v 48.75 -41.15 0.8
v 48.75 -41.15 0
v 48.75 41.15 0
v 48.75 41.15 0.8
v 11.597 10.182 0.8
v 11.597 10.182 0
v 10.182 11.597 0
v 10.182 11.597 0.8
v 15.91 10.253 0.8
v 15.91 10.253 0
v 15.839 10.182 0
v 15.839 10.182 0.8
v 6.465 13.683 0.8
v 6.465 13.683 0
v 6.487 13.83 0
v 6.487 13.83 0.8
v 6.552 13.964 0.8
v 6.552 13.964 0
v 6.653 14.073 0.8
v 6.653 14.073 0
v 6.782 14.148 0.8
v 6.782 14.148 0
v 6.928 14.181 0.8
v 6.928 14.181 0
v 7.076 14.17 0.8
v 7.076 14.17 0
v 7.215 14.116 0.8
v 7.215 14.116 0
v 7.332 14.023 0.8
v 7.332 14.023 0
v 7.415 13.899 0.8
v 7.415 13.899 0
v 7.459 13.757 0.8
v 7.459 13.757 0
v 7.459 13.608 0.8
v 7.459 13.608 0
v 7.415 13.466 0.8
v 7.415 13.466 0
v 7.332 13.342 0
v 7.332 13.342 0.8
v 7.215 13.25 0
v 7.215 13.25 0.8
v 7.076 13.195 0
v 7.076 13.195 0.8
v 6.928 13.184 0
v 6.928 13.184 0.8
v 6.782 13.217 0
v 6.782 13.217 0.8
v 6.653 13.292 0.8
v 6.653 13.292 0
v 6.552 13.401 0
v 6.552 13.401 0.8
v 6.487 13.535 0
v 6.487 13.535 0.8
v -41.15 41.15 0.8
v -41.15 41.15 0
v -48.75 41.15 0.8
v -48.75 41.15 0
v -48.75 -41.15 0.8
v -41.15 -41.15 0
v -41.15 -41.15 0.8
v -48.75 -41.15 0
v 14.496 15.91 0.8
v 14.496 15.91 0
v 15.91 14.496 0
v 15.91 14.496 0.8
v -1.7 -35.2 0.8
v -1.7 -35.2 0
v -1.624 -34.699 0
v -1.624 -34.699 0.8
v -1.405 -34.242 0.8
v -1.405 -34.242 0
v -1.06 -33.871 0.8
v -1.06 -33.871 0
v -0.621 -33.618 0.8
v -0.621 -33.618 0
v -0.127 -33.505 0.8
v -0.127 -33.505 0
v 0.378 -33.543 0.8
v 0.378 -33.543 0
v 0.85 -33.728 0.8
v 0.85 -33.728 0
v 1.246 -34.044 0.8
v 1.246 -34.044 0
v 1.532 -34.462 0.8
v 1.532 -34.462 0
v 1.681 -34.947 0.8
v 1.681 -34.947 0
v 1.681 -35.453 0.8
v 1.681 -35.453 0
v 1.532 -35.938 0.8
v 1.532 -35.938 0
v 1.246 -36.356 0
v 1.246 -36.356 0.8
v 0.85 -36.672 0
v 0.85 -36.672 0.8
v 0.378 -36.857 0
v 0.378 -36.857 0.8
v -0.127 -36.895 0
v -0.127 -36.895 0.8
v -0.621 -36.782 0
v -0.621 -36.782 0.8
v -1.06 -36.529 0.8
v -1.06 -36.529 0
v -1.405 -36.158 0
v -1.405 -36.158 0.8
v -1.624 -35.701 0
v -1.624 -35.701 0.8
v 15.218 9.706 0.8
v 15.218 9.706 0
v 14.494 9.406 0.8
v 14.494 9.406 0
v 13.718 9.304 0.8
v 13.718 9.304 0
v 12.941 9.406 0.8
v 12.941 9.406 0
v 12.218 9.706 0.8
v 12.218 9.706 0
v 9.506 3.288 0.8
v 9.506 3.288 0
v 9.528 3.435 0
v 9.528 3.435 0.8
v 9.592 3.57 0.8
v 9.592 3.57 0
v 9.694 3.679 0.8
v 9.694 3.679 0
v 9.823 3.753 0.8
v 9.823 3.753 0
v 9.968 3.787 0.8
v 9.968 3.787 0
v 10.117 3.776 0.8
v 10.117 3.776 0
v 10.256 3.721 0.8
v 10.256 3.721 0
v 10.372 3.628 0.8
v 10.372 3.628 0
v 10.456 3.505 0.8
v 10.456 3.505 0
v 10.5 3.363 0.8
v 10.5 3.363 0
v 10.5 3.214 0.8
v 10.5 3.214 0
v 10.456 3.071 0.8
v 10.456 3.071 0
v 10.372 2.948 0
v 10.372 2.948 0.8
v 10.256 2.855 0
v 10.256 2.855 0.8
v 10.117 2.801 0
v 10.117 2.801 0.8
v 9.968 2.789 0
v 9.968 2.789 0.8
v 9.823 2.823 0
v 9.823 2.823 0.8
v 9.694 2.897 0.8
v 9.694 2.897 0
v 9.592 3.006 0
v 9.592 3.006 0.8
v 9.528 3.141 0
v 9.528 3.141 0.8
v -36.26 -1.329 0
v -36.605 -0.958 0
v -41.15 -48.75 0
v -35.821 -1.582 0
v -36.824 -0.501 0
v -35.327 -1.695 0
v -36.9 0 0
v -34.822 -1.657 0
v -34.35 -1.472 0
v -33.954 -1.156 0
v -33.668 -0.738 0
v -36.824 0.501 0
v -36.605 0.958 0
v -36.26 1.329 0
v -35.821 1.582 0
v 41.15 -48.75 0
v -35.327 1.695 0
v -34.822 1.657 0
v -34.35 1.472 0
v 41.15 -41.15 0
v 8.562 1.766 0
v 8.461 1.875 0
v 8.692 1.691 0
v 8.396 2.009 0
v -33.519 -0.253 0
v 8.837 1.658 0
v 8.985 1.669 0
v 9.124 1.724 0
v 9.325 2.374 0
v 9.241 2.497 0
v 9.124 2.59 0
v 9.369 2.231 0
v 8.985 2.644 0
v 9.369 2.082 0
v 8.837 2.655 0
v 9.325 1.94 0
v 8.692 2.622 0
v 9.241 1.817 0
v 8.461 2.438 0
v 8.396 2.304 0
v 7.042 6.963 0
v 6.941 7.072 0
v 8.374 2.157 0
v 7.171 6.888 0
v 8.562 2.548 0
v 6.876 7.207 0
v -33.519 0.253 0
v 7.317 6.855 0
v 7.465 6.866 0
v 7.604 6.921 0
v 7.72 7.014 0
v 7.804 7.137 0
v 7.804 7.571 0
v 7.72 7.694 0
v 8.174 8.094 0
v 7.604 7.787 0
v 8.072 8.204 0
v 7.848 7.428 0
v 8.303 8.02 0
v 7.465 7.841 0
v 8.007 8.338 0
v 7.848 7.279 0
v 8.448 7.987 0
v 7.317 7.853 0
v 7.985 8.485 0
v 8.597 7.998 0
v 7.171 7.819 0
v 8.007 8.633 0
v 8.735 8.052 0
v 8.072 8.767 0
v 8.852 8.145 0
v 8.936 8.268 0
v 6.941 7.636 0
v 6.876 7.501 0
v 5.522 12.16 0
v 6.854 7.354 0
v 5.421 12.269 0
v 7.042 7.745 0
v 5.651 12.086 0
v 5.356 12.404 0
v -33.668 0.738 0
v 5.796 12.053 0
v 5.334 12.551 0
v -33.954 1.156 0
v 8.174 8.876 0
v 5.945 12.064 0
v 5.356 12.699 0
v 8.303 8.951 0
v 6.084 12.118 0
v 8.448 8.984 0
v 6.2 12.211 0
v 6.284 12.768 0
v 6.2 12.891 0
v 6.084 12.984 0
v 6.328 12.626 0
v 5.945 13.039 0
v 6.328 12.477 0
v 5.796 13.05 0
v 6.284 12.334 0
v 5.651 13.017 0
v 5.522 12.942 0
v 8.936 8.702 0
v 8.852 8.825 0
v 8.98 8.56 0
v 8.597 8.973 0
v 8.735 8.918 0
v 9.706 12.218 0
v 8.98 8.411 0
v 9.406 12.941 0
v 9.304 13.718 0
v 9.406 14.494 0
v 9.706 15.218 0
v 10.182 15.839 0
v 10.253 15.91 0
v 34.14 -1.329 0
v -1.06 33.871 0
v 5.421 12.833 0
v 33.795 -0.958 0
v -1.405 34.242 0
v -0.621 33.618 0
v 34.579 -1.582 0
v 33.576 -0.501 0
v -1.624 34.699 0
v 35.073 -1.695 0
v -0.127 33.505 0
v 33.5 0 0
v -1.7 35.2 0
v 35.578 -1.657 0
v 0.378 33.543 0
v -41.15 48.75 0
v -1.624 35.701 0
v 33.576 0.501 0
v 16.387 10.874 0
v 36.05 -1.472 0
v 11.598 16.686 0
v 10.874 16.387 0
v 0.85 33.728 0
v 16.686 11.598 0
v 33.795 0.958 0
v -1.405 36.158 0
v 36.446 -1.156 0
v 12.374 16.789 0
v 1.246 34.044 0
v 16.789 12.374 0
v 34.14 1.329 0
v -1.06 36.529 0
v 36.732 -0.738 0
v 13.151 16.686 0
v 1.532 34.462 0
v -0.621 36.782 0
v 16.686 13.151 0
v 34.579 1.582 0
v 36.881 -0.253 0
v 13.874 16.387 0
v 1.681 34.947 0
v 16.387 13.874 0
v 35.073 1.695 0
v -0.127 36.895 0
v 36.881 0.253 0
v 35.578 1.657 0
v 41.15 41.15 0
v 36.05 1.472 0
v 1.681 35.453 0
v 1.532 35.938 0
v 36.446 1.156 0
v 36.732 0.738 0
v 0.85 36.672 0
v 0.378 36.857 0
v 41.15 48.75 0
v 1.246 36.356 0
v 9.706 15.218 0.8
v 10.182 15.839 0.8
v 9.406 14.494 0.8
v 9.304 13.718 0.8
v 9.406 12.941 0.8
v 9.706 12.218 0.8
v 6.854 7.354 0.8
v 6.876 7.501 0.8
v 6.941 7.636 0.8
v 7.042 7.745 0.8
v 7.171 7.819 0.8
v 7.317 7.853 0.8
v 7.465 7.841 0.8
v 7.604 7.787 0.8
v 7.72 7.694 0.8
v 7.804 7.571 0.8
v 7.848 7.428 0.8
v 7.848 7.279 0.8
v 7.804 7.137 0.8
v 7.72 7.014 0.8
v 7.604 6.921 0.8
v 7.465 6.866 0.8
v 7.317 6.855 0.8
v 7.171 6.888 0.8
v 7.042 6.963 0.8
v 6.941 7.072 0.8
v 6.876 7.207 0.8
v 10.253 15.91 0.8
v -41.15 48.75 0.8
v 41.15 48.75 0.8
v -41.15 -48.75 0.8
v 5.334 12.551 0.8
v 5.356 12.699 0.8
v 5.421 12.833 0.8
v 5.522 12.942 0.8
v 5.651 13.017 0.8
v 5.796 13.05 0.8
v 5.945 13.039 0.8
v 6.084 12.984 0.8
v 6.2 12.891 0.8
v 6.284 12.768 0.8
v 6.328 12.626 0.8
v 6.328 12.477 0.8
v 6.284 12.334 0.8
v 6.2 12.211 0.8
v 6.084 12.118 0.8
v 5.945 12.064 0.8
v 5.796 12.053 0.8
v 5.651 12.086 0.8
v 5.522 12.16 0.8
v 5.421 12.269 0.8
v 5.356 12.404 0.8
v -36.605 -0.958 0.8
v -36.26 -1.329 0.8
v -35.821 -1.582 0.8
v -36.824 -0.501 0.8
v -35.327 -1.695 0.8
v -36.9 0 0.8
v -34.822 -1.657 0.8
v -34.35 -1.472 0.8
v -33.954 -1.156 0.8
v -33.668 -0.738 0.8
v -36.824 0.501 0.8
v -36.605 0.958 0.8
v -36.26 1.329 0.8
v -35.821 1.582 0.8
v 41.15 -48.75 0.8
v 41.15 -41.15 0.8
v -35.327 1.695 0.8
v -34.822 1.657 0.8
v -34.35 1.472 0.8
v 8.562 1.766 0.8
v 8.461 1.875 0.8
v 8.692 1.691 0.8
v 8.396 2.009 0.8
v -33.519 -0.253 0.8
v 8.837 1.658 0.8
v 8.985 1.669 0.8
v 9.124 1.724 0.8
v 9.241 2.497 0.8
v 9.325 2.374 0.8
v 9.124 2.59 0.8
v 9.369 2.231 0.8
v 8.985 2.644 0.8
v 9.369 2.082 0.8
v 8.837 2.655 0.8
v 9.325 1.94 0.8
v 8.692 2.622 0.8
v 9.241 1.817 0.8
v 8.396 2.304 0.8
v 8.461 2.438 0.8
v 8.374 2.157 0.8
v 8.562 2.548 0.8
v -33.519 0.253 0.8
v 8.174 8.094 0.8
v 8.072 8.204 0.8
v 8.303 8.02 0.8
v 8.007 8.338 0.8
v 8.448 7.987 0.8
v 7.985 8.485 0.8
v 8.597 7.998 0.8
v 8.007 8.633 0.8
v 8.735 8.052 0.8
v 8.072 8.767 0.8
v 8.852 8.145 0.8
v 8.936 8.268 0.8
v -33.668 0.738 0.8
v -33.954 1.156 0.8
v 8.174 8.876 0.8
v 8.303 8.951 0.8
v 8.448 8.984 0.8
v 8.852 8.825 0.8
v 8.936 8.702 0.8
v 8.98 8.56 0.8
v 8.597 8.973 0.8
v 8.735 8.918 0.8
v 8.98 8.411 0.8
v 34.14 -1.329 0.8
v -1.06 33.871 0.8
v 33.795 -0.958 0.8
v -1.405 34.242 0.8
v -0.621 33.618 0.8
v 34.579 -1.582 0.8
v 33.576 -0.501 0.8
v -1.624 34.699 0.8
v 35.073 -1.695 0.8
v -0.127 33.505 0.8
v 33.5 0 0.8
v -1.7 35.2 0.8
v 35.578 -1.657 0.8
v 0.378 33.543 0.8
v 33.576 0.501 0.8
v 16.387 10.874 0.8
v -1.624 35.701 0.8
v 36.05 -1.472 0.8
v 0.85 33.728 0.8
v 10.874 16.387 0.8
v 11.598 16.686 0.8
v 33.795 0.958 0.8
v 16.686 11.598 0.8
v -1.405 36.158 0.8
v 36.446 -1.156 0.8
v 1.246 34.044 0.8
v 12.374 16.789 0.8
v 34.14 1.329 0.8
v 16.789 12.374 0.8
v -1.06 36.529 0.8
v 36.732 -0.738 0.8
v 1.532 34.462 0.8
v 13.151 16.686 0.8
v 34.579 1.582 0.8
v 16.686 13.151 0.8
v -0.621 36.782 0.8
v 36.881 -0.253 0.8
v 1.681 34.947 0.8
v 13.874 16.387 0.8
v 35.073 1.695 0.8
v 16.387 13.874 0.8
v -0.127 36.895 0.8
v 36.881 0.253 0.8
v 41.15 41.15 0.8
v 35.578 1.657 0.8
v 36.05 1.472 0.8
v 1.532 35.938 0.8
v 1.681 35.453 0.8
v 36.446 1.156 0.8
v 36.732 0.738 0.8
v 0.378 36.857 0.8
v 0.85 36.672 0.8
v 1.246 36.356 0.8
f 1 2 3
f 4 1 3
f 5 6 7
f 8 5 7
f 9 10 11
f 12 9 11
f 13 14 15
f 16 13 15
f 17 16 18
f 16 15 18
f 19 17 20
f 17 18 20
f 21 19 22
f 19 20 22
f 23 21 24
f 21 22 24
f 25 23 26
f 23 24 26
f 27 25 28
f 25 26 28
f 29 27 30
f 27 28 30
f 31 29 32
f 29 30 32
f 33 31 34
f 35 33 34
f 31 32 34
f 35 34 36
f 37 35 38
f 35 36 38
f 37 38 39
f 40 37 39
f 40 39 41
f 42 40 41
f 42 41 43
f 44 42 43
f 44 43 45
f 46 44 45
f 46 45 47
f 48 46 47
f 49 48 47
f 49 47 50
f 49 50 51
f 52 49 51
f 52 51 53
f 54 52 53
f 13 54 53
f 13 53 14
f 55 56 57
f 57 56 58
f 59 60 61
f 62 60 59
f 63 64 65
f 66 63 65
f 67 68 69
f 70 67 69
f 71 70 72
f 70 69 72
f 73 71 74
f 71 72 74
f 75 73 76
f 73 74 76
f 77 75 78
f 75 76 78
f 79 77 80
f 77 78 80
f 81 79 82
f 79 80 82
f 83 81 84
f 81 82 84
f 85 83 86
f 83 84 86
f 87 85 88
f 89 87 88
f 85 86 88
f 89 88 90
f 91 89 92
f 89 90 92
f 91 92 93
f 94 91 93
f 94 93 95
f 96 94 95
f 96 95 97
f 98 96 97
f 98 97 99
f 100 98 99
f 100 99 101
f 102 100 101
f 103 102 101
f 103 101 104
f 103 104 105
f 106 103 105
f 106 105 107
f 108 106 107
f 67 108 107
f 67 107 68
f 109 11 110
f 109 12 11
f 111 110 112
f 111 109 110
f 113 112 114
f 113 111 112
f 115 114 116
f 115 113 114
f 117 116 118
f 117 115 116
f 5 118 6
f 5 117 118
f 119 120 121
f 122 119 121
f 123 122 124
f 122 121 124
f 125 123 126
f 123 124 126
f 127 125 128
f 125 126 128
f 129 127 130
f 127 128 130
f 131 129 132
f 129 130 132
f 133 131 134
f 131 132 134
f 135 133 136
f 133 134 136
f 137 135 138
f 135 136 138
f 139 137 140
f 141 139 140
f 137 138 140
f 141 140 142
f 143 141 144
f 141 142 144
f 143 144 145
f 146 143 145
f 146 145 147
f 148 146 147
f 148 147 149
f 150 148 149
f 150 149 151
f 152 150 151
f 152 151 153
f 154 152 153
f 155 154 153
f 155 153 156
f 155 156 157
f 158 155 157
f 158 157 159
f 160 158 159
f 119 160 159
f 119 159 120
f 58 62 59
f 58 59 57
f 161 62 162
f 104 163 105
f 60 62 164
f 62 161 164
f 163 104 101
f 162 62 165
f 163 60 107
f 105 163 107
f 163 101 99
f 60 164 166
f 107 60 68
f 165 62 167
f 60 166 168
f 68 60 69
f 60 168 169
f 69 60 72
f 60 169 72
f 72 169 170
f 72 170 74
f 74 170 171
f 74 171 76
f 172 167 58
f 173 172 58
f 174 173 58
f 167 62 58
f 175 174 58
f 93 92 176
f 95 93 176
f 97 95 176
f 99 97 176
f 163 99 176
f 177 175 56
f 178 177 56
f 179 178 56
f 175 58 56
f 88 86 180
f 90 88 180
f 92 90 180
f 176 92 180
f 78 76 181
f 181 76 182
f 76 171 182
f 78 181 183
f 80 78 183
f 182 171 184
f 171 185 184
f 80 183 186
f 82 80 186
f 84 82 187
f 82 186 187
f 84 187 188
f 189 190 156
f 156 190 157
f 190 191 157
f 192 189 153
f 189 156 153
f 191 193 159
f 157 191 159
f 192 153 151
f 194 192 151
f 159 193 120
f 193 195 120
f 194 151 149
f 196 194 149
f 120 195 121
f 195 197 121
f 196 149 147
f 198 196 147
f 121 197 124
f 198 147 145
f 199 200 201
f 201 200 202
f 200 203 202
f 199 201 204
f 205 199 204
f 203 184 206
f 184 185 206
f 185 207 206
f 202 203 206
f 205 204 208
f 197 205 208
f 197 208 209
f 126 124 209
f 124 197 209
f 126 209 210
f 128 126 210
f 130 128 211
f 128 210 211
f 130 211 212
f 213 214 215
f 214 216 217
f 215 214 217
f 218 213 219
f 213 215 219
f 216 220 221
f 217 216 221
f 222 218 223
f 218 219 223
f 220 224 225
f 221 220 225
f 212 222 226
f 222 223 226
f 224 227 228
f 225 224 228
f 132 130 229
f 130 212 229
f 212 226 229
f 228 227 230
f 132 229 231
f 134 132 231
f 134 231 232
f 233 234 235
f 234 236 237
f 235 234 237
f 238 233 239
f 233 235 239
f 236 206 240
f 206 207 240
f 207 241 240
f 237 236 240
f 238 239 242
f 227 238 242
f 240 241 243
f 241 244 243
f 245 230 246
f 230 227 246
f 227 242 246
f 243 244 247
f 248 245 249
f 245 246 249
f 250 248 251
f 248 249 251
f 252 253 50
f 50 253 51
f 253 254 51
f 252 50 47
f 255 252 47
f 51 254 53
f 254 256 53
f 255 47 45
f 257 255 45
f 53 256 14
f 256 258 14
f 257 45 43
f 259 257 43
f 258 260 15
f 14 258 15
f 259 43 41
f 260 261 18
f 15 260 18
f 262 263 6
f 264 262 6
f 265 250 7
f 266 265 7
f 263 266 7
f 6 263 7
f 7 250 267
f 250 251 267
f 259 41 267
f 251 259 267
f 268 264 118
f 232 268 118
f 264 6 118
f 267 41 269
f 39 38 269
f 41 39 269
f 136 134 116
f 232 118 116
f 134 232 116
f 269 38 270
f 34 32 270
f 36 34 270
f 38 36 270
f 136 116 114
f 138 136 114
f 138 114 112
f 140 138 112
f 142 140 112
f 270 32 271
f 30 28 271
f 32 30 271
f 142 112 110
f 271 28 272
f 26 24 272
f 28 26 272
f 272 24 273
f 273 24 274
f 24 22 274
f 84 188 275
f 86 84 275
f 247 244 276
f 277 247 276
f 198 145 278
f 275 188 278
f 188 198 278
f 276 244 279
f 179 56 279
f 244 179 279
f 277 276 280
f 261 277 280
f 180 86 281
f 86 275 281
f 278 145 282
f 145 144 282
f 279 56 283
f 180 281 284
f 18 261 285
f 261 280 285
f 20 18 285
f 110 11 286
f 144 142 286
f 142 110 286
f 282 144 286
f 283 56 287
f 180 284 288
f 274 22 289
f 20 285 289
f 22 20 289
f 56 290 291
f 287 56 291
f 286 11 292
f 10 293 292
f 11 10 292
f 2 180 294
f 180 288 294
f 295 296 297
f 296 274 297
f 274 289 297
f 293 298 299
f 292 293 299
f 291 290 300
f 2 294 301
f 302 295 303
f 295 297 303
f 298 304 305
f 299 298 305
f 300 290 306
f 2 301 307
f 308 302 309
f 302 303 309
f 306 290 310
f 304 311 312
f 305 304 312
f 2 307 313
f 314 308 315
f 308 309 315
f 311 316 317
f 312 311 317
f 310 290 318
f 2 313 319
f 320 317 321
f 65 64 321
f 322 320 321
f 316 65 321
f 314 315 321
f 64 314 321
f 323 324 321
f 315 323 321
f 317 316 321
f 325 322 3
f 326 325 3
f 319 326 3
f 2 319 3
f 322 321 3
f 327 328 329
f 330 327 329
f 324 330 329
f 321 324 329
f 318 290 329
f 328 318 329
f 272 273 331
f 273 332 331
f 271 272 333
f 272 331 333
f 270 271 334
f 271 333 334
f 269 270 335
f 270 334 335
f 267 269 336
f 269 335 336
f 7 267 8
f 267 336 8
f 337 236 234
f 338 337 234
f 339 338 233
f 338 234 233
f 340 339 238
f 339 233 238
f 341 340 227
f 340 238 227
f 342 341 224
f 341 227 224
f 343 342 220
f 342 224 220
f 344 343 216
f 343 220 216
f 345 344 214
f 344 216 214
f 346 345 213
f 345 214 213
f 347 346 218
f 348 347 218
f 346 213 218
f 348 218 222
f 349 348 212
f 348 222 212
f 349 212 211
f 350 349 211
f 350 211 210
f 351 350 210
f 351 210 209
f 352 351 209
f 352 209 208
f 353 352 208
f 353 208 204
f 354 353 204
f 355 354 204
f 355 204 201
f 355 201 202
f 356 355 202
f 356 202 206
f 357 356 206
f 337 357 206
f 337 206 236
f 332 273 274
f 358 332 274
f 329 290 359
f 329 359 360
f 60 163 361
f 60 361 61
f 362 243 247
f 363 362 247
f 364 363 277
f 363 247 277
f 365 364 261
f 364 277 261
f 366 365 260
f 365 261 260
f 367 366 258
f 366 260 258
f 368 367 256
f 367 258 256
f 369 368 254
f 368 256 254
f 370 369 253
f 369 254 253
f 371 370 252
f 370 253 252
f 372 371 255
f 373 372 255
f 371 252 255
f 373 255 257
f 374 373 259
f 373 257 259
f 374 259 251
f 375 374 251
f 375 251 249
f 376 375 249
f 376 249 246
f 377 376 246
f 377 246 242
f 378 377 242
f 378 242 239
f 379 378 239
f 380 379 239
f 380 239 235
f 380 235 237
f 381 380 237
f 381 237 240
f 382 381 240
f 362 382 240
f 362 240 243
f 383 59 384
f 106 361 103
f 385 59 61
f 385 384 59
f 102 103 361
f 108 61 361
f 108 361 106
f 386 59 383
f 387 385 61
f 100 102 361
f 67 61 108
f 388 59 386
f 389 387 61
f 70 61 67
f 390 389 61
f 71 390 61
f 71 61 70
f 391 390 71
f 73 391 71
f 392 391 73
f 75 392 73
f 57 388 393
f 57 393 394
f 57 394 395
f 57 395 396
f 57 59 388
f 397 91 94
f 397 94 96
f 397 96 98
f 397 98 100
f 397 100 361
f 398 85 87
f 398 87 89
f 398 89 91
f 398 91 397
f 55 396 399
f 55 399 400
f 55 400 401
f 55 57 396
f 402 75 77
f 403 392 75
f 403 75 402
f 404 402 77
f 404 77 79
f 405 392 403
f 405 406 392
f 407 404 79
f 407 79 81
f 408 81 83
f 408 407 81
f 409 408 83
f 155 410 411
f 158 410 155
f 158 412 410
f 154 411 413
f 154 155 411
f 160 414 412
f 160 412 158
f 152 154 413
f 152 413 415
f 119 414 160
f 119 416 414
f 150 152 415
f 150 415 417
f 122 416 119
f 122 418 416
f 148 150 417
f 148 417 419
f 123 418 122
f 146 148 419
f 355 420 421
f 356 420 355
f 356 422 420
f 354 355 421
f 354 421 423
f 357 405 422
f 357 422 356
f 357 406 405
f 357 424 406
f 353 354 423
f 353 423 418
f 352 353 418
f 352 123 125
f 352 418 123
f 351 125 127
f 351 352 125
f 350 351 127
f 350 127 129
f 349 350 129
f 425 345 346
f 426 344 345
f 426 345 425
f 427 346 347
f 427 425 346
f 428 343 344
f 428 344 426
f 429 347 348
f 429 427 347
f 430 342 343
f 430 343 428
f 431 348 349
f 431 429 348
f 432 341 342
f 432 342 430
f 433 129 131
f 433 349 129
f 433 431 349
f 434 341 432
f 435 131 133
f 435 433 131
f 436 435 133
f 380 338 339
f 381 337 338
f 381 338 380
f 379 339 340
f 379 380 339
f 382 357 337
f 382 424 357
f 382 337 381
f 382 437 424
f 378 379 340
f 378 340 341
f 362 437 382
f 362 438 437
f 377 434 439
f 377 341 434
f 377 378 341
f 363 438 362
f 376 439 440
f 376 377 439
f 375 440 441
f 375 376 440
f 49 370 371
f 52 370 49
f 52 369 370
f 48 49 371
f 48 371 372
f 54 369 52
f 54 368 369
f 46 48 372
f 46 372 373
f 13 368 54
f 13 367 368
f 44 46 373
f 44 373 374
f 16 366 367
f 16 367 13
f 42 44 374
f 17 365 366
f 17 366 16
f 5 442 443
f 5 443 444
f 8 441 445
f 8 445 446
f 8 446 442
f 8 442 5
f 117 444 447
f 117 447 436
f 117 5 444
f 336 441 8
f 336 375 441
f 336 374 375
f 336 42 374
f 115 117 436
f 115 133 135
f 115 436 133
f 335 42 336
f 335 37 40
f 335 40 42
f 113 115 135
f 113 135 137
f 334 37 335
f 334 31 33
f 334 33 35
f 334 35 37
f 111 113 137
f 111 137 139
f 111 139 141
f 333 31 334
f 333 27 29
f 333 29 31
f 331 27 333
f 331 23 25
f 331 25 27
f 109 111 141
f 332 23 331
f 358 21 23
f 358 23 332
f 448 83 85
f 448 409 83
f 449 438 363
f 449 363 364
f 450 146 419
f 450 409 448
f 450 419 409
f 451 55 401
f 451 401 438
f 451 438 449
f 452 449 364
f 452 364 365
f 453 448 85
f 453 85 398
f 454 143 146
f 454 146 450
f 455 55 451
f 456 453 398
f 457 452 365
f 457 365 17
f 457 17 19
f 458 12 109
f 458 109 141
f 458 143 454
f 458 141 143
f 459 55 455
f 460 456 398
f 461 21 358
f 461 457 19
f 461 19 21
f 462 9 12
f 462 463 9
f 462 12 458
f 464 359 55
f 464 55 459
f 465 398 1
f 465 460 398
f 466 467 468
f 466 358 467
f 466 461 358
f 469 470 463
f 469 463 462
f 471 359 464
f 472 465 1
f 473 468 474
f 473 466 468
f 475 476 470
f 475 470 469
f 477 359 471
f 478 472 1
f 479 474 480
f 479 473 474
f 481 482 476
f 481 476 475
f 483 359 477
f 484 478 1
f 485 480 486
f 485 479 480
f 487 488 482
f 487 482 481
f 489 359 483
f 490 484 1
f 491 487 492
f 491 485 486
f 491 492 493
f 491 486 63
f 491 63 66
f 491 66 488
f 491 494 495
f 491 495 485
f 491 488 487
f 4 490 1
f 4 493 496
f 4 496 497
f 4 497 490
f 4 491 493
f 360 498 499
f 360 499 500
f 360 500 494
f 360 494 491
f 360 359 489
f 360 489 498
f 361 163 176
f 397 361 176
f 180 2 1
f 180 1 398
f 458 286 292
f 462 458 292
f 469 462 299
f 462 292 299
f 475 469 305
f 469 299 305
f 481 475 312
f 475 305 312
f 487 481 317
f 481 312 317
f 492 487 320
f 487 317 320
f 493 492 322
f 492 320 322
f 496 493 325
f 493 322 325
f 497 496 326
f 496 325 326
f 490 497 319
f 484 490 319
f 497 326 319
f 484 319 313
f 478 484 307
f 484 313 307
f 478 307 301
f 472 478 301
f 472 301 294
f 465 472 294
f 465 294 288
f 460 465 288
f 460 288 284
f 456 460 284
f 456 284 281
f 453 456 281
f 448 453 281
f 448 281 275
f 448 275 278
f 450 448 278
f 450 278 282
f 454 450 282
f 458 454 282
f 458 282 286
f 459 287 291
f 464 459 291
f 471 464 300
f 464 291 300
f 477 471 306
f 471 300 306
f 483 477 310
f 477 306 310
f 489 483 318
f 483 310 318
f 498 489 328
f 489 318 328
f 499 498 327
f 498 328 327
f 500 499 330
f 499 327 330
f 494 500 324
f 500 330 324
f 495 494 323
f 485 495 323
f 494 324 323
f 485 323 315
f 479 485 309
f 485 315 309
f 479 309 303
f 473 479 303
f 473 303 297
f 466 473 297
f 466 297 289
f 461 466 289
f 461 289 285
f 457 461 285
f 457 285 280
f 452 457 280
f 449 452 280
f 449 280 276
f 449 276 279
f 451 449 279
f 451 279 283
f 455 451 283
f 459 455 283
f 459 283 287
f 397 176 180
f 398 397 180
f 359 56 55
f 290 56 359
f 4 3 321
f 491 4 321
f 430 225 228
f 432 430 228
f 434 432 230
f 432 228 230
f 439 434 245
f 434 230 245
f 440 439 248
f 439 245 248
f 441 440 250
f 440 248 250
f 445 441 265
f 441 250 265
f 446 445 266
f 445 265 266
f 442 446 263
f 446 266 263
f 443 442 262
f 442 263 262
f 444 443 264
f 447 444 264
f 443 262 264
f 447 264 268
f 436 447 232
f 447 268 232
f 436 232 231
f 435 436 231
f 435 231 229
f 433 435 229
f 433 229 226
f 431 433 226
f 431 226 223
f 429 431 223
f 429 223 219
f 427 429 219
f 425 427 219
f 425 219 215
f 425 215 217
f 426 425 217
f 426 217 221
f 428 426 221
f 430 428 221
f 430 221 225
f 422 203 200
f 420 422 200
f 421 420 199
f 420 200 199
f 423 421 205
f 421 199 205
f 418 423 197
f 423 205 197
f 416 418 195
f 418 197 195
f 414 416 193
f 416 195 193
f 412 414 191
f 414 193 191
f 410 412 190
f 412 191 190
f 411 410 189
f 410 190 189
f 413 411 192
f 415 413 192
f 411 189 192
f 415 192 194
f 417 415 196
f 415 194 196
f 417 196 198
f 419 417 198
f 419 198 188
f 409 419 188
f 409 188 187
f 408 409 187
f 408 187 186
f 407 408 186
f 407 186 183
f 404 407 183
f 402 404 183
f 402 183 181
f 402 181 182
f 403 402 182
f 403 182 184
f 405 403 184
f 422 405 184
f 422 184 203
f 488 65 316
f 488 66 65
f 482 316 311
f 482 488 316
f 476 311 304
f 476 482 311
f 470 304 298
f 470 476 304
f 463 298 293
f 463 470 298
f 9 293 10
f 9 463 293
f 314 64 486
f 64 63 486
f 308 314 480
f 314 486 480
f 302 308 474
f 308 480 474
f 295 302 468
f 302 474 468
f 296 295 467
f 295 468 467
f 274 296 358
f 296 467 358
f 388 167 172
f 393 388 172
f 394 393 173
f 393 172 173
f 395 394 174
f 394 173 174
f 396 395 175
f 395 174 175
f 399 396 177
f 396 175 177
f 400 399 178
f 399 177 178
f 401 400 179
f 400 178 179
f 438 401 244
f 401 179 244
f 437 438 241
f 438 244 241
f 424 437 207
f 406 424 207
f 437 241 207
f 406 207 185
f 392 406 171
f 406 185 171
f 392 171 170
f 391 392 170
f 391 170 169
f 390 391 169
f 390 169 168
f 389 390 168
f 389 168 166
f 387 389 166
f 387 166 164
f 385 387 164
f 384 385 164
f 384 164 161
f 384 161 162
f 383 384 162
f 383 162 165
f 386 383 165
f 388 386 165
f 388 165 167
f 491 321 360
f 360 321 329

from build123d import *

# Parameters (mm, degrees)
SKETCH1_W           = 97.5
SKETCH1_H           = 97.5
BOSS_EXTRUDE1_DEPTH = 0.8
SKETCH2_W           = 7.6
SKETCH2_H           = 7.6
CUT_EXTRUDE1_DEPTH  = 1.8
SKETCH3_R           = 1.7
CUT_EXTRUDE2_DEPTH  = 1.8
CUT_EXTRUDE3_DEPTH  = 1.8
SKETCH5_R           = 0.5
CUT_EXTRUDE4_DEPTH  = 1.8
FILLET2_R           = 3


with BuildPart() as part:
    # Sketch1 → Boss-Extrude1 (new body)
    with BuildSketch(Plane.XY):
        Rectangle(SKETCH1_W, SKETCH1_H)
    extrude(amount=BOSS_EXTRUDE1_DEPTH)

    # Sketch2 → Cut-Extrude1 (cut, through all)
    with BuildSketch(Plane(origin=(0, 0, 0), x_dir=(-1, 0, 0), z_dir=(0, 0, -1))):
        with Locations((-44.95, 44.95)):
            Rectangle(SKETCH2_W, SKETCH2_H)
        with Locations((-44.95, -44.95)):
            Rectangle(SKETCH2_W, SKETCH2_H)
        with Locations((44.95, -44.95)):
            Rectangle(SKETCH2_W, SKETCH2_H)
        with Locations((44.95, 44.95)):
            Rectangle(SKETCH2_W, SKETCH2_H)
    extrude(amount=-CUT_EXTRUDE1_DEPTH, mode=Mode.SUBTRACT)

    # Sketch3 → Cut-Extrude2 (cut, through all)
    with BuildSketch(Plane(origin=(0, 0, 0), x_dir=(-1, 0, 0), z_dir=(0, 0, -1))):
        with Locations((0, 35.2)):
            Circle(SKETCH3_R)
        with Locations((35.2, 0)):
            Circle(SKETCH3_R)
        with Locations((0, -35.2)):
            Circle(SKETCH3_R)
        with Locations((-35.2, 0)):
            Circle(SKETCH3_R)
    extrude(amount=-CUT_EXTRUDE2_DEPTH, mode=Mode.SUBTRACT)

    # Sketch4 → Cut-Extrude3 (cut, through all)
    with BuildSketch(Plane(origin=(0, 0, 0), x_dir=(-1, 0, 0), z_dir=(0, 0, -1))):
        Polygon((-18.03122292, 12.374368671), (-13.717871555, 8.061017306), (-8.061017306, 13.717871555), (-12.374368671, 18.03122292), align=None)
    extrude(amount=-CUT_EXTRUDE3_DEPTH, mode=Mode.SUBTRACT)

    # Sketch5 → Cut-Extrude4 (cut, through all)
    with BuildSketch(Plane(origin=(0, 0, 0), x_dir=(-1, 0, 0), z_dir=(0, 0, -1))):
        with Locations((-6.965001795, 13.682516216)):
            Circle(SKETCH5_R)
        with Locations((-5.833630945, 12.551145366)):
            Circle(SKETCH5_R)
        with Locations((-8.485281374, 8.485281374)):
            Circle(SKETCH5_R)
        with Locations((-7.353910524, 7.353910524)):
            Circle(SKETCH5_R)
        with Locations((-10.005560954, 3.288046533)):
            Circle(SKETCH5_R)
        with Locations((-8.874190104, 2.156675683)):
            Circle(SKETCH5_R)
    extrude(amount=-CUT_EXTRUDE4_DEPTH, mode=Mode.SUBTRACT)

    # Fillet2
    fillet2_edges = [part.edges().sort_by_distance(p)[0] for p in [
        (18.03122292, 12.374368671, 0.4),
        (12.374368671, 18.03122292, 0.4),
        (8.061017306, 13.717871555, 0.4),
        (13.717871555, 8.061017306, 0.4),
    ]]
    fillet(fillet2_edges, radius=FILLET2_R)


solid = part.part
